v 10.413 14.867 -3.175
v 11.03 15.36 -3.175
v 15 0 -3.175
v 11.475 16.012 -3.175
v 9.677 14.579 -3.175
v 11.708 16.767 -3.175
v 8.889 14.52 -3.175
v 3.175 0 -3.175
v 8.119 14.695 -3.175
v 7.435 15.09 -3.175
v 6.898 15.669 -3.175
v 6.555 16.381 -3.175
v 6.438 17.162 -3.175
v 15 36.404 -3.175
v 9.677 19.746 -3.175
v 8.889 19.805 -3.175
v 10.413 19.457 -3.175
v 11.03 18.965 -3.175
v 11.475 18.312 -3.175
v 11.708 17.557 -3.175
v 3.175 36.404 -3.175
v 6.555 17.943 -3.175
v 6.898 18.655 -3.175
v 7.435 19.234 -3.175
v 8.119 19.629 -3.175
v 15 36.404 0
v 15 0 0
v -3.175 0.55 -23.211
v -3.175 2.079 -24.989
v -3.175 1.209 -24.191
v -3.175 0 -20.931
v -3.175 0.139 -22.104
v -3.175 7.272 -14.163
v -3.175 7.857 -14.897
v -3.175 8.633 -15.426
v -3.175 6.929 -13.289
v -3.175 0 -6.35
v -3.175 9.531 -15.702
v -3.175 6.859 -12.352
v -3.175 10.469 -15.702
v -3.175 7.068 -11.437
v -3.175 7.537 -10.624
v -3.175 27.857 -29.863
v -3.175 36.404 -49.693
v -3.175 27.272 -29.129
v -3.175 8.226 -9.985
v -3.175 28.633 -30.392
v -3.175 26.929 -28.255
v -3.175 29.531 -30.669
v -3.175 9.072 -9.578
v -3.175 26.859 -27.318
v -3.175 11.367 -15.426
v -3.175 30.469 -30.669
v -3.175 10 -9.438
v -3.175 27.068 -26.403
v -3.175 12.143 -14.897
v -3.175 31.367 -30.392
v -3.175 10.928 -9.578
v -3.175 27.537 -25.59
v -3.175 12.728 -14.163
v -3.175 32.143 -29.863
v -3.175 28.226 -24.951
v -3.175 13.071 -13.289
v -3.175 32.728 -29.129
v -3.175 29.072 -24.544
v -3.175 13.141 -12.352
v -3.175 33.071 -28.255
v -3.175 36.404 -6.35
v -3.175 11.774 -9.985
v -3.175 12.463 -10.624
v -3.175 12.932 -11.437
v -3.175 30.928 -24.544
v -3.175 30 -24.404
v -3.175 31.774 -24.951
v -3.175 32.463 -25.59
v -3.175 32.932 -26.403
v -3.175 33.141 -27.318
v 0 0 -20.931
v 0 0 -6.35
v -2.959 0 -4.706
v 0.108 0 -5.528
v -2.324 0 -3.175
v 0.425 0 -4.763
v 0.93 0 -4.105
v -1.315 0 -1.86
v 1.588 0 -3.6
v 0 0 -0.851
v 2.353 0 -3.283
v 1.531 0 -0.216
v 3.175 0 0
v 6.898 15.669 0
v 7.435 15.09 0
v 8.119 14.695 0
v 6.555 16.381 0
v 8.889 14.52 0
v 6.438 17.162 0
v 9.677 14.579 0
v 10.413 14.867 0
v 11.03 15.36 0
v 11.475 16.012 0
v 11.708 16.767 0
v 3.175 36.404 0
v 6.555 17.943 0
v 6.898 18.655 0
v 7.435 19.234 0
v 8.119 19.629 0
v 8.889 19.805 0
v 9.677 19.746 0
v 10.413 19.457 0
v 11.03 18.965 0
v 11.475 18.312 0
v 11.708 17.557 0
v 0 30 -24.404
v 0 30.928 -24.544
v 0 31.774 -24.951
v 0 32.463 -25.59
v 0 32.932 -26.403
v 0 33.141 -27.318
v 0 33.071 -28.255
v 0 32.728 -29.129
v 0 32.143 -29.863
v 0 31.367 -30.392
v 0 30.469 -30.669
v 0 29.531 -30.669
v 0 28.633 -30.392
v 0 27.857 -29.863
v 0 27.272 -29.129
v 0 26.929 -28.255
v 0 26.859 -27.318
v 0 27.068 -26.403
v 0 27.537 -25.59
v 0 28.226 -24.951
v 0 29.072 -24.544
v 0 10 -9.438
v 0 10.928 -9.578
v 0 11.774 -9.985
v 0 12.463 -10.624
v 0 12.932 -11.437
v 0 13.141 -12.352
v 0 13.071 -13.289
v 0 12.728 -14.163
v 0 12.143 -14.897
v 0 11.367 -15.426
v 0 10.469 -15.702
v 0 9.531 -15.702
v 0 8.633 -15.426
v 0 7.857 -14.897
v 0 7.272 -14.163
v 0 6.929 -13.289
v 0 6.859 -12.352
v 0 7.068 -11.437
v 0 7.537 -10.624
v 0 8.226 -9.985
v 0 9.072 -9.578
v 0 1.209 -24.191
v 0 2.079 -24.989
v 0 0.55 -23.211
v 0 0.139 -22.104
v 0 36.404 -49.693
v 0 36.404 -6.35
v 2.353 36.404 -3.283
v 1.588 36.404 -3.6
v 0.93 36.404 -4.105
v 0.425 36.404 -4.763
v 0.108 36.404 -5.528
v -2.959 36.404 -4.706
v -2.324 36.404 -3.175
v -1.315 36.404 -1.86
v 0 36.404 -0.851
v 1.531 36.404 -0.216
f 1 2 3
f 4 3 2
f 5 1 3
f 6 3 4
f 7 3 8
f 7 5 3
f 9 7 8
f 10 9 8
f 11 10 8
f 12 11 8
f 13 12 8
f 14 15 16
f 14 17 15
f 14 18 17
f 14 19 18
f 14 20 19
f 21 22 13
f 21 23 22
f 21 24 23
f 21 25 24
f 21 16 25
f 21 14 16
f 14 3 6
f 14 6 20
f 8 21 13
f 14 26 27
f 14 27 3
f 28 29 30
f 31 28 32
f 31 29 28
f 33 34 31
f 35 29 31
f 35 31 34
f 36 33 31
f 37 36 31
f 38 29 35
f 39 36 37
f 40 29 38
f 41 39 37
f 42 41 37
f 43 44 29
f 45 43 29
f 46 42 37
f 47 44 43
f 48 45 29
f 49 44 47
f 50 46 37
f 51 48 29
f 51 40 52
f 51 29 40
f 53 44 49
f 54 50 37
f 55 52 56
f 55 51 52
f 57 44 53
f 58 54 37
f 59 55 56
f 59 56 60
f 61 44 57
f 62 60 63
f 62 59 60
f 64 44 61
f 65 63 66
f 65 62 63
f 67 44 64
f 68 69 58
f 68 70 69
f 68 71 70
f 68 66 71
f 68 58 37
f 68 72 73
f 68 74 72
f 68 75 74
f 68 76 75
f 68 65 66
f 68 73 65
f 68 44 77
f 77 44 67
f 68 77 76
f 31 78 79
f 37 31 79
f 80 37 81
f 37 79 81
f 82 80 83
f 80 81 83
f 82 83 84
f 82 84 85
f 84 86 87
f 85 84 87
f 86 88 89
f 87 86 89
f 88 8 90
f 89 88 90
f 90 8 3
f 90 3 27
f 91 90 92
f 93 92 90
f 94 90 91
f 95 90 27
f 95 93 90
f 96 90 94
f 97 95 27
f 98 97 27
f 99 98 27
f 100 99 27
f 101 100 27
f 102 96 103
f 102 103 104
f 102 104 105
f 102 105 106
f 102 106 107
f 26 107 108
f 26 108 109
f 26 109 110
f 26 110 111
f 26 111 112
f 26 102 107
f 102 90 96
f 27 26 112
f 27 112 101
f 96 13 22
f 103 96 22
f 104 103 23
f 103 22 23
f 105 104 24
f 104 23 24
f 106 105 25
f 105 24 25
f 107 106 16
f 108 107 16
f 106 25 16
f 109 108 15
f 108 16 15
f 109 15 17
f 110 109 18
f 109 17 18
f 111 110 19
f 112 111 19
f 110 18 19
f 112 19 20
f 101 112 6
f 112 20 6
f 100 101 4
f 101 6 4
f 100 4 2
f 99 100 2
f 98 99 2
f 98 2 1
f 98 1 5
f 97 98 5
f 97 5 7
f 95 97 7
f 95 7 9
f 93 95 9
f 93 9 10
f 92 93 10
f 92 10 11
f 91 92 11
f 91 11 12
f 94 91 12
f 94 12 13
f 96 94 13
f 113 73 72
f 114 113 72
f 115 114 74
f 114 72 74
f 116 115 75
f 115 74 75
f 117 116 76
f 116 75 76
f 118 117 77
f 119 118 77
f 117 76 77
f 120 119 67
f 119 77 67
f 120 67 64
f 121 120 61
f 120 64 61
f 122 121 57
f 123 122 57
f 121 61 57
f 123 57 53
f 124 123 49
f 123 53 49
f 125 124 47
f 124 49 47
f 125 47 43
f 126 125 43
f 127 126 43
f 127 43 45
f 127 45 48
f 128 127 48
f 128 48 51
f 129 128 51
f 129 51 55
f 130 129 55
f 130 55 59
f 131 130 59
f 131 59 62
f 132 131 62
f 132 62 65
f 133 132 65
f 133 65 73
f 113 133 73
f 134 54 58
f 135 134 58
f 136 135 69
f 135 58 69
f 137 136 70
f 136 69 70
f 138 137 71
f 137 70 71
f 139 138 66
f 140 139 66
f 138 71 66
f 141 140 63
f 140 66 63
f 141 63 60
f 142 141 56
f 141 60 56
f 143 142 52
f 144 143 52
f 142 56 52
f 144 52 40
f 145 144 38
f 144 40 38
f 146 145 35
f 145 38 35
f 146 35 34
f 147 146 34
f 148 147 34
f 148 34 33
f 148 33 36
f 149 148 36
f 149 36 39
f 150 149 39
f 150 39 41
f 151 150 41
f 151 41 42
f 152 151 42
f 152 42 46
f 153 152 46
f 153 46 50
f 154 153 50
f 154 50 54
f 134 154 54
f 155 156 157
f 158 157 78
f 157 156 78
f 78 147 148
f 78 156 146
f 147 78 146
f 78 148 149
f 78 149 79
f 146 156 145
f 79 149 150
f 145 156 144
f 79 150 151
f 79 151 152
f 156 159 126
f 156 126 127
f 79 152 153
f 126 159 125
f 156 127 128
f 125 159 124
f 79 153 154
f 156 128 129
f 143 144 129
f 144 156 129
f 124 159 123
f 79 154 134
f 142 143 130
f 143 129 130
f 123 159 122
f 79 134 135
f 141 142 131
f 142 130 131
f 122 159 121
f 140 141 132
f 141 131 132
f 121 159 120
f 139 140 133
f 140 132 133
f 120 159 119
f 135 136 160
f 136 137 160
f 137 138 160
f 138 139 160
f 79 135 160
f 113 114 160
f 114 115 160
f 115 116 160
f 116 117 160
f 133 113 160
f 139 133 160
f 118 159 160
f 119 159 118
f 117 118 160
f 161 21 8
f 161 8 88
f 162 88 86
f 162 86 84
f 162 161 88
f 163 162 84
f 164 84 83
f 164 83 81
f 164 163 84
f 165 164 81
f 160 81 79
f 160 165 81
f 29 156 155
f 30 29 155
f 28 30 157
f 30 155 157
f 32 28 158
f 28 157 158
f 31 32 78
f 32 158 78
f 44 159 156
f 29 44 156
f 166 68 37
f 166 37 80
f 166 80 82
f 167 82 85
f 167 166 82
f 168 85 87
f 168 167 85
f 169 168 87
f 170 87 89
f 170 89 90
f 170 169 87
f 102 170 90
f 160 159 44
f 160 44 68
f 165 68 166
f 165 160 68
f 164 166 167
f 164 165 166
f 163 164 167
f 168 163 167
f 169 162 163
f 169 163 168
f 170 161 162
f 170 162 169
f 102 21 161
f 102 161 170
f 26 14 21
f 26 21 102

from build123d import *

# Parameters (mm, degrees)
BASE_FLANGE1_DEPTH           = 3.175
SKETCH7_R                    = 3.15
CUT_EXTRUDE3_DEPTH           = 10
EDGE_FLANGE1_STRIP_W         = 19.05
EDGE_FLANGE1_STRIP_H         = 3.175
EDGE_FLANGE1_STRIP_CUT_DEPTH = 36.40397533
EDGE_FLANGE1_DEPTH           = 36.40397533
SKETCH12_R                   = 2.65
CUT_EXTRUDE4_DEPTH           = 10


# Sheet-metal steps are written as plain solids
with BuildPart() as part:
    # Sketch2 → Base-Flange1 (new body)
    with BuildSketch(Plane(origin=(0, 0, 0), x_dir=(0, 0, -1), z_dir=(1, 0, 0))):
        with BuildLine():
            Line((0, 0), (0, 36.40397533))
            Line((0, 36.40397533), (49.693245392, 36.40397533))
            Line((49.693245392, 36.40397533), (24.989293369, 2.07924376))
            ThreePointArc((24.989293369, 2.07924376), (23.211005522, 0.550068473), (20.931069251, 0))
            Line((20.931069251, 0), (0, 0))
        make_face()
    extrude(amount=-BASE_FLANGE1_DEPTH)

    # Sketch7 → Cut-Extrude3 (cut)
    with BuildSketch(Plane.ZY.offset(3.175)):
        with Locations((-27.553898694, 30)):
            Circle(SKETCH7_R)
        with Locations((-12.587671369, 10)):
            Circle(SKETCH7_R)
    extrude(amount=-CUT_EXTRUDE3_DEPTH, mode=Mode.SUBTRACT)

    # Edge-Flange1 strip (across the edge) → Edge-Flange1 strip cut (cut)
    with BuildSketch(Plane(origin=(0, 36.40397533, 0), x_dir=(0, 0, -1), z_dir=(0, -1, 0))):
        with Locations((-3.175, -1.5875)):
            Rectangle(EDGE_FLANGE1_STRIP_W, EDGE_FLANGE1_STRIP_H)
    extrude(amount=EDGE_FLANGE1_STRIP_CUT_DEPTH, mode=Mode.SUBTRACT)

    # Edge-Flange1 section (across the edge) → Edge-Flange1 (add)
    with BuildSketch(Plane(origin=(0, 36.40397533, 0), x_dir=(0, 0, -1), z_dir=(0, -1, 0))):
        with BuildLine():
            Line((0, 3.175), (0, 15))
            Line((0, 15), (3.175, 15))
            Line((3.175, 15), (3.175, 3.175))
            ThreePointArc((3.175, 3.175), (4.10493597, 0.92993597), (6.35, 0))
            Line((6.35, 0), (6.35, -3.175))
            ThreePointArc((6.35, -3.175), (1.859871939, -1.315128061), (0, 3.175))
        make_face()
    extrude(amount=EDGE_FLANGE1_DEPTH)

    # Sketch12 → Cut-Extrude4 (cut)
    with BuildSketch(Plane(origin=(0, 0, -3.175), x_dir=(-1, 0, 0), z_dir=(0, 0, -1))):
        with Locations((-9.0875, 17.162271256)):
            Circle(SKETCH12_R)
    extrude(amount=-CUT_EXTRUDE4_DEPTH, mode=Mode.SUBTRACT)


solid = part.part
